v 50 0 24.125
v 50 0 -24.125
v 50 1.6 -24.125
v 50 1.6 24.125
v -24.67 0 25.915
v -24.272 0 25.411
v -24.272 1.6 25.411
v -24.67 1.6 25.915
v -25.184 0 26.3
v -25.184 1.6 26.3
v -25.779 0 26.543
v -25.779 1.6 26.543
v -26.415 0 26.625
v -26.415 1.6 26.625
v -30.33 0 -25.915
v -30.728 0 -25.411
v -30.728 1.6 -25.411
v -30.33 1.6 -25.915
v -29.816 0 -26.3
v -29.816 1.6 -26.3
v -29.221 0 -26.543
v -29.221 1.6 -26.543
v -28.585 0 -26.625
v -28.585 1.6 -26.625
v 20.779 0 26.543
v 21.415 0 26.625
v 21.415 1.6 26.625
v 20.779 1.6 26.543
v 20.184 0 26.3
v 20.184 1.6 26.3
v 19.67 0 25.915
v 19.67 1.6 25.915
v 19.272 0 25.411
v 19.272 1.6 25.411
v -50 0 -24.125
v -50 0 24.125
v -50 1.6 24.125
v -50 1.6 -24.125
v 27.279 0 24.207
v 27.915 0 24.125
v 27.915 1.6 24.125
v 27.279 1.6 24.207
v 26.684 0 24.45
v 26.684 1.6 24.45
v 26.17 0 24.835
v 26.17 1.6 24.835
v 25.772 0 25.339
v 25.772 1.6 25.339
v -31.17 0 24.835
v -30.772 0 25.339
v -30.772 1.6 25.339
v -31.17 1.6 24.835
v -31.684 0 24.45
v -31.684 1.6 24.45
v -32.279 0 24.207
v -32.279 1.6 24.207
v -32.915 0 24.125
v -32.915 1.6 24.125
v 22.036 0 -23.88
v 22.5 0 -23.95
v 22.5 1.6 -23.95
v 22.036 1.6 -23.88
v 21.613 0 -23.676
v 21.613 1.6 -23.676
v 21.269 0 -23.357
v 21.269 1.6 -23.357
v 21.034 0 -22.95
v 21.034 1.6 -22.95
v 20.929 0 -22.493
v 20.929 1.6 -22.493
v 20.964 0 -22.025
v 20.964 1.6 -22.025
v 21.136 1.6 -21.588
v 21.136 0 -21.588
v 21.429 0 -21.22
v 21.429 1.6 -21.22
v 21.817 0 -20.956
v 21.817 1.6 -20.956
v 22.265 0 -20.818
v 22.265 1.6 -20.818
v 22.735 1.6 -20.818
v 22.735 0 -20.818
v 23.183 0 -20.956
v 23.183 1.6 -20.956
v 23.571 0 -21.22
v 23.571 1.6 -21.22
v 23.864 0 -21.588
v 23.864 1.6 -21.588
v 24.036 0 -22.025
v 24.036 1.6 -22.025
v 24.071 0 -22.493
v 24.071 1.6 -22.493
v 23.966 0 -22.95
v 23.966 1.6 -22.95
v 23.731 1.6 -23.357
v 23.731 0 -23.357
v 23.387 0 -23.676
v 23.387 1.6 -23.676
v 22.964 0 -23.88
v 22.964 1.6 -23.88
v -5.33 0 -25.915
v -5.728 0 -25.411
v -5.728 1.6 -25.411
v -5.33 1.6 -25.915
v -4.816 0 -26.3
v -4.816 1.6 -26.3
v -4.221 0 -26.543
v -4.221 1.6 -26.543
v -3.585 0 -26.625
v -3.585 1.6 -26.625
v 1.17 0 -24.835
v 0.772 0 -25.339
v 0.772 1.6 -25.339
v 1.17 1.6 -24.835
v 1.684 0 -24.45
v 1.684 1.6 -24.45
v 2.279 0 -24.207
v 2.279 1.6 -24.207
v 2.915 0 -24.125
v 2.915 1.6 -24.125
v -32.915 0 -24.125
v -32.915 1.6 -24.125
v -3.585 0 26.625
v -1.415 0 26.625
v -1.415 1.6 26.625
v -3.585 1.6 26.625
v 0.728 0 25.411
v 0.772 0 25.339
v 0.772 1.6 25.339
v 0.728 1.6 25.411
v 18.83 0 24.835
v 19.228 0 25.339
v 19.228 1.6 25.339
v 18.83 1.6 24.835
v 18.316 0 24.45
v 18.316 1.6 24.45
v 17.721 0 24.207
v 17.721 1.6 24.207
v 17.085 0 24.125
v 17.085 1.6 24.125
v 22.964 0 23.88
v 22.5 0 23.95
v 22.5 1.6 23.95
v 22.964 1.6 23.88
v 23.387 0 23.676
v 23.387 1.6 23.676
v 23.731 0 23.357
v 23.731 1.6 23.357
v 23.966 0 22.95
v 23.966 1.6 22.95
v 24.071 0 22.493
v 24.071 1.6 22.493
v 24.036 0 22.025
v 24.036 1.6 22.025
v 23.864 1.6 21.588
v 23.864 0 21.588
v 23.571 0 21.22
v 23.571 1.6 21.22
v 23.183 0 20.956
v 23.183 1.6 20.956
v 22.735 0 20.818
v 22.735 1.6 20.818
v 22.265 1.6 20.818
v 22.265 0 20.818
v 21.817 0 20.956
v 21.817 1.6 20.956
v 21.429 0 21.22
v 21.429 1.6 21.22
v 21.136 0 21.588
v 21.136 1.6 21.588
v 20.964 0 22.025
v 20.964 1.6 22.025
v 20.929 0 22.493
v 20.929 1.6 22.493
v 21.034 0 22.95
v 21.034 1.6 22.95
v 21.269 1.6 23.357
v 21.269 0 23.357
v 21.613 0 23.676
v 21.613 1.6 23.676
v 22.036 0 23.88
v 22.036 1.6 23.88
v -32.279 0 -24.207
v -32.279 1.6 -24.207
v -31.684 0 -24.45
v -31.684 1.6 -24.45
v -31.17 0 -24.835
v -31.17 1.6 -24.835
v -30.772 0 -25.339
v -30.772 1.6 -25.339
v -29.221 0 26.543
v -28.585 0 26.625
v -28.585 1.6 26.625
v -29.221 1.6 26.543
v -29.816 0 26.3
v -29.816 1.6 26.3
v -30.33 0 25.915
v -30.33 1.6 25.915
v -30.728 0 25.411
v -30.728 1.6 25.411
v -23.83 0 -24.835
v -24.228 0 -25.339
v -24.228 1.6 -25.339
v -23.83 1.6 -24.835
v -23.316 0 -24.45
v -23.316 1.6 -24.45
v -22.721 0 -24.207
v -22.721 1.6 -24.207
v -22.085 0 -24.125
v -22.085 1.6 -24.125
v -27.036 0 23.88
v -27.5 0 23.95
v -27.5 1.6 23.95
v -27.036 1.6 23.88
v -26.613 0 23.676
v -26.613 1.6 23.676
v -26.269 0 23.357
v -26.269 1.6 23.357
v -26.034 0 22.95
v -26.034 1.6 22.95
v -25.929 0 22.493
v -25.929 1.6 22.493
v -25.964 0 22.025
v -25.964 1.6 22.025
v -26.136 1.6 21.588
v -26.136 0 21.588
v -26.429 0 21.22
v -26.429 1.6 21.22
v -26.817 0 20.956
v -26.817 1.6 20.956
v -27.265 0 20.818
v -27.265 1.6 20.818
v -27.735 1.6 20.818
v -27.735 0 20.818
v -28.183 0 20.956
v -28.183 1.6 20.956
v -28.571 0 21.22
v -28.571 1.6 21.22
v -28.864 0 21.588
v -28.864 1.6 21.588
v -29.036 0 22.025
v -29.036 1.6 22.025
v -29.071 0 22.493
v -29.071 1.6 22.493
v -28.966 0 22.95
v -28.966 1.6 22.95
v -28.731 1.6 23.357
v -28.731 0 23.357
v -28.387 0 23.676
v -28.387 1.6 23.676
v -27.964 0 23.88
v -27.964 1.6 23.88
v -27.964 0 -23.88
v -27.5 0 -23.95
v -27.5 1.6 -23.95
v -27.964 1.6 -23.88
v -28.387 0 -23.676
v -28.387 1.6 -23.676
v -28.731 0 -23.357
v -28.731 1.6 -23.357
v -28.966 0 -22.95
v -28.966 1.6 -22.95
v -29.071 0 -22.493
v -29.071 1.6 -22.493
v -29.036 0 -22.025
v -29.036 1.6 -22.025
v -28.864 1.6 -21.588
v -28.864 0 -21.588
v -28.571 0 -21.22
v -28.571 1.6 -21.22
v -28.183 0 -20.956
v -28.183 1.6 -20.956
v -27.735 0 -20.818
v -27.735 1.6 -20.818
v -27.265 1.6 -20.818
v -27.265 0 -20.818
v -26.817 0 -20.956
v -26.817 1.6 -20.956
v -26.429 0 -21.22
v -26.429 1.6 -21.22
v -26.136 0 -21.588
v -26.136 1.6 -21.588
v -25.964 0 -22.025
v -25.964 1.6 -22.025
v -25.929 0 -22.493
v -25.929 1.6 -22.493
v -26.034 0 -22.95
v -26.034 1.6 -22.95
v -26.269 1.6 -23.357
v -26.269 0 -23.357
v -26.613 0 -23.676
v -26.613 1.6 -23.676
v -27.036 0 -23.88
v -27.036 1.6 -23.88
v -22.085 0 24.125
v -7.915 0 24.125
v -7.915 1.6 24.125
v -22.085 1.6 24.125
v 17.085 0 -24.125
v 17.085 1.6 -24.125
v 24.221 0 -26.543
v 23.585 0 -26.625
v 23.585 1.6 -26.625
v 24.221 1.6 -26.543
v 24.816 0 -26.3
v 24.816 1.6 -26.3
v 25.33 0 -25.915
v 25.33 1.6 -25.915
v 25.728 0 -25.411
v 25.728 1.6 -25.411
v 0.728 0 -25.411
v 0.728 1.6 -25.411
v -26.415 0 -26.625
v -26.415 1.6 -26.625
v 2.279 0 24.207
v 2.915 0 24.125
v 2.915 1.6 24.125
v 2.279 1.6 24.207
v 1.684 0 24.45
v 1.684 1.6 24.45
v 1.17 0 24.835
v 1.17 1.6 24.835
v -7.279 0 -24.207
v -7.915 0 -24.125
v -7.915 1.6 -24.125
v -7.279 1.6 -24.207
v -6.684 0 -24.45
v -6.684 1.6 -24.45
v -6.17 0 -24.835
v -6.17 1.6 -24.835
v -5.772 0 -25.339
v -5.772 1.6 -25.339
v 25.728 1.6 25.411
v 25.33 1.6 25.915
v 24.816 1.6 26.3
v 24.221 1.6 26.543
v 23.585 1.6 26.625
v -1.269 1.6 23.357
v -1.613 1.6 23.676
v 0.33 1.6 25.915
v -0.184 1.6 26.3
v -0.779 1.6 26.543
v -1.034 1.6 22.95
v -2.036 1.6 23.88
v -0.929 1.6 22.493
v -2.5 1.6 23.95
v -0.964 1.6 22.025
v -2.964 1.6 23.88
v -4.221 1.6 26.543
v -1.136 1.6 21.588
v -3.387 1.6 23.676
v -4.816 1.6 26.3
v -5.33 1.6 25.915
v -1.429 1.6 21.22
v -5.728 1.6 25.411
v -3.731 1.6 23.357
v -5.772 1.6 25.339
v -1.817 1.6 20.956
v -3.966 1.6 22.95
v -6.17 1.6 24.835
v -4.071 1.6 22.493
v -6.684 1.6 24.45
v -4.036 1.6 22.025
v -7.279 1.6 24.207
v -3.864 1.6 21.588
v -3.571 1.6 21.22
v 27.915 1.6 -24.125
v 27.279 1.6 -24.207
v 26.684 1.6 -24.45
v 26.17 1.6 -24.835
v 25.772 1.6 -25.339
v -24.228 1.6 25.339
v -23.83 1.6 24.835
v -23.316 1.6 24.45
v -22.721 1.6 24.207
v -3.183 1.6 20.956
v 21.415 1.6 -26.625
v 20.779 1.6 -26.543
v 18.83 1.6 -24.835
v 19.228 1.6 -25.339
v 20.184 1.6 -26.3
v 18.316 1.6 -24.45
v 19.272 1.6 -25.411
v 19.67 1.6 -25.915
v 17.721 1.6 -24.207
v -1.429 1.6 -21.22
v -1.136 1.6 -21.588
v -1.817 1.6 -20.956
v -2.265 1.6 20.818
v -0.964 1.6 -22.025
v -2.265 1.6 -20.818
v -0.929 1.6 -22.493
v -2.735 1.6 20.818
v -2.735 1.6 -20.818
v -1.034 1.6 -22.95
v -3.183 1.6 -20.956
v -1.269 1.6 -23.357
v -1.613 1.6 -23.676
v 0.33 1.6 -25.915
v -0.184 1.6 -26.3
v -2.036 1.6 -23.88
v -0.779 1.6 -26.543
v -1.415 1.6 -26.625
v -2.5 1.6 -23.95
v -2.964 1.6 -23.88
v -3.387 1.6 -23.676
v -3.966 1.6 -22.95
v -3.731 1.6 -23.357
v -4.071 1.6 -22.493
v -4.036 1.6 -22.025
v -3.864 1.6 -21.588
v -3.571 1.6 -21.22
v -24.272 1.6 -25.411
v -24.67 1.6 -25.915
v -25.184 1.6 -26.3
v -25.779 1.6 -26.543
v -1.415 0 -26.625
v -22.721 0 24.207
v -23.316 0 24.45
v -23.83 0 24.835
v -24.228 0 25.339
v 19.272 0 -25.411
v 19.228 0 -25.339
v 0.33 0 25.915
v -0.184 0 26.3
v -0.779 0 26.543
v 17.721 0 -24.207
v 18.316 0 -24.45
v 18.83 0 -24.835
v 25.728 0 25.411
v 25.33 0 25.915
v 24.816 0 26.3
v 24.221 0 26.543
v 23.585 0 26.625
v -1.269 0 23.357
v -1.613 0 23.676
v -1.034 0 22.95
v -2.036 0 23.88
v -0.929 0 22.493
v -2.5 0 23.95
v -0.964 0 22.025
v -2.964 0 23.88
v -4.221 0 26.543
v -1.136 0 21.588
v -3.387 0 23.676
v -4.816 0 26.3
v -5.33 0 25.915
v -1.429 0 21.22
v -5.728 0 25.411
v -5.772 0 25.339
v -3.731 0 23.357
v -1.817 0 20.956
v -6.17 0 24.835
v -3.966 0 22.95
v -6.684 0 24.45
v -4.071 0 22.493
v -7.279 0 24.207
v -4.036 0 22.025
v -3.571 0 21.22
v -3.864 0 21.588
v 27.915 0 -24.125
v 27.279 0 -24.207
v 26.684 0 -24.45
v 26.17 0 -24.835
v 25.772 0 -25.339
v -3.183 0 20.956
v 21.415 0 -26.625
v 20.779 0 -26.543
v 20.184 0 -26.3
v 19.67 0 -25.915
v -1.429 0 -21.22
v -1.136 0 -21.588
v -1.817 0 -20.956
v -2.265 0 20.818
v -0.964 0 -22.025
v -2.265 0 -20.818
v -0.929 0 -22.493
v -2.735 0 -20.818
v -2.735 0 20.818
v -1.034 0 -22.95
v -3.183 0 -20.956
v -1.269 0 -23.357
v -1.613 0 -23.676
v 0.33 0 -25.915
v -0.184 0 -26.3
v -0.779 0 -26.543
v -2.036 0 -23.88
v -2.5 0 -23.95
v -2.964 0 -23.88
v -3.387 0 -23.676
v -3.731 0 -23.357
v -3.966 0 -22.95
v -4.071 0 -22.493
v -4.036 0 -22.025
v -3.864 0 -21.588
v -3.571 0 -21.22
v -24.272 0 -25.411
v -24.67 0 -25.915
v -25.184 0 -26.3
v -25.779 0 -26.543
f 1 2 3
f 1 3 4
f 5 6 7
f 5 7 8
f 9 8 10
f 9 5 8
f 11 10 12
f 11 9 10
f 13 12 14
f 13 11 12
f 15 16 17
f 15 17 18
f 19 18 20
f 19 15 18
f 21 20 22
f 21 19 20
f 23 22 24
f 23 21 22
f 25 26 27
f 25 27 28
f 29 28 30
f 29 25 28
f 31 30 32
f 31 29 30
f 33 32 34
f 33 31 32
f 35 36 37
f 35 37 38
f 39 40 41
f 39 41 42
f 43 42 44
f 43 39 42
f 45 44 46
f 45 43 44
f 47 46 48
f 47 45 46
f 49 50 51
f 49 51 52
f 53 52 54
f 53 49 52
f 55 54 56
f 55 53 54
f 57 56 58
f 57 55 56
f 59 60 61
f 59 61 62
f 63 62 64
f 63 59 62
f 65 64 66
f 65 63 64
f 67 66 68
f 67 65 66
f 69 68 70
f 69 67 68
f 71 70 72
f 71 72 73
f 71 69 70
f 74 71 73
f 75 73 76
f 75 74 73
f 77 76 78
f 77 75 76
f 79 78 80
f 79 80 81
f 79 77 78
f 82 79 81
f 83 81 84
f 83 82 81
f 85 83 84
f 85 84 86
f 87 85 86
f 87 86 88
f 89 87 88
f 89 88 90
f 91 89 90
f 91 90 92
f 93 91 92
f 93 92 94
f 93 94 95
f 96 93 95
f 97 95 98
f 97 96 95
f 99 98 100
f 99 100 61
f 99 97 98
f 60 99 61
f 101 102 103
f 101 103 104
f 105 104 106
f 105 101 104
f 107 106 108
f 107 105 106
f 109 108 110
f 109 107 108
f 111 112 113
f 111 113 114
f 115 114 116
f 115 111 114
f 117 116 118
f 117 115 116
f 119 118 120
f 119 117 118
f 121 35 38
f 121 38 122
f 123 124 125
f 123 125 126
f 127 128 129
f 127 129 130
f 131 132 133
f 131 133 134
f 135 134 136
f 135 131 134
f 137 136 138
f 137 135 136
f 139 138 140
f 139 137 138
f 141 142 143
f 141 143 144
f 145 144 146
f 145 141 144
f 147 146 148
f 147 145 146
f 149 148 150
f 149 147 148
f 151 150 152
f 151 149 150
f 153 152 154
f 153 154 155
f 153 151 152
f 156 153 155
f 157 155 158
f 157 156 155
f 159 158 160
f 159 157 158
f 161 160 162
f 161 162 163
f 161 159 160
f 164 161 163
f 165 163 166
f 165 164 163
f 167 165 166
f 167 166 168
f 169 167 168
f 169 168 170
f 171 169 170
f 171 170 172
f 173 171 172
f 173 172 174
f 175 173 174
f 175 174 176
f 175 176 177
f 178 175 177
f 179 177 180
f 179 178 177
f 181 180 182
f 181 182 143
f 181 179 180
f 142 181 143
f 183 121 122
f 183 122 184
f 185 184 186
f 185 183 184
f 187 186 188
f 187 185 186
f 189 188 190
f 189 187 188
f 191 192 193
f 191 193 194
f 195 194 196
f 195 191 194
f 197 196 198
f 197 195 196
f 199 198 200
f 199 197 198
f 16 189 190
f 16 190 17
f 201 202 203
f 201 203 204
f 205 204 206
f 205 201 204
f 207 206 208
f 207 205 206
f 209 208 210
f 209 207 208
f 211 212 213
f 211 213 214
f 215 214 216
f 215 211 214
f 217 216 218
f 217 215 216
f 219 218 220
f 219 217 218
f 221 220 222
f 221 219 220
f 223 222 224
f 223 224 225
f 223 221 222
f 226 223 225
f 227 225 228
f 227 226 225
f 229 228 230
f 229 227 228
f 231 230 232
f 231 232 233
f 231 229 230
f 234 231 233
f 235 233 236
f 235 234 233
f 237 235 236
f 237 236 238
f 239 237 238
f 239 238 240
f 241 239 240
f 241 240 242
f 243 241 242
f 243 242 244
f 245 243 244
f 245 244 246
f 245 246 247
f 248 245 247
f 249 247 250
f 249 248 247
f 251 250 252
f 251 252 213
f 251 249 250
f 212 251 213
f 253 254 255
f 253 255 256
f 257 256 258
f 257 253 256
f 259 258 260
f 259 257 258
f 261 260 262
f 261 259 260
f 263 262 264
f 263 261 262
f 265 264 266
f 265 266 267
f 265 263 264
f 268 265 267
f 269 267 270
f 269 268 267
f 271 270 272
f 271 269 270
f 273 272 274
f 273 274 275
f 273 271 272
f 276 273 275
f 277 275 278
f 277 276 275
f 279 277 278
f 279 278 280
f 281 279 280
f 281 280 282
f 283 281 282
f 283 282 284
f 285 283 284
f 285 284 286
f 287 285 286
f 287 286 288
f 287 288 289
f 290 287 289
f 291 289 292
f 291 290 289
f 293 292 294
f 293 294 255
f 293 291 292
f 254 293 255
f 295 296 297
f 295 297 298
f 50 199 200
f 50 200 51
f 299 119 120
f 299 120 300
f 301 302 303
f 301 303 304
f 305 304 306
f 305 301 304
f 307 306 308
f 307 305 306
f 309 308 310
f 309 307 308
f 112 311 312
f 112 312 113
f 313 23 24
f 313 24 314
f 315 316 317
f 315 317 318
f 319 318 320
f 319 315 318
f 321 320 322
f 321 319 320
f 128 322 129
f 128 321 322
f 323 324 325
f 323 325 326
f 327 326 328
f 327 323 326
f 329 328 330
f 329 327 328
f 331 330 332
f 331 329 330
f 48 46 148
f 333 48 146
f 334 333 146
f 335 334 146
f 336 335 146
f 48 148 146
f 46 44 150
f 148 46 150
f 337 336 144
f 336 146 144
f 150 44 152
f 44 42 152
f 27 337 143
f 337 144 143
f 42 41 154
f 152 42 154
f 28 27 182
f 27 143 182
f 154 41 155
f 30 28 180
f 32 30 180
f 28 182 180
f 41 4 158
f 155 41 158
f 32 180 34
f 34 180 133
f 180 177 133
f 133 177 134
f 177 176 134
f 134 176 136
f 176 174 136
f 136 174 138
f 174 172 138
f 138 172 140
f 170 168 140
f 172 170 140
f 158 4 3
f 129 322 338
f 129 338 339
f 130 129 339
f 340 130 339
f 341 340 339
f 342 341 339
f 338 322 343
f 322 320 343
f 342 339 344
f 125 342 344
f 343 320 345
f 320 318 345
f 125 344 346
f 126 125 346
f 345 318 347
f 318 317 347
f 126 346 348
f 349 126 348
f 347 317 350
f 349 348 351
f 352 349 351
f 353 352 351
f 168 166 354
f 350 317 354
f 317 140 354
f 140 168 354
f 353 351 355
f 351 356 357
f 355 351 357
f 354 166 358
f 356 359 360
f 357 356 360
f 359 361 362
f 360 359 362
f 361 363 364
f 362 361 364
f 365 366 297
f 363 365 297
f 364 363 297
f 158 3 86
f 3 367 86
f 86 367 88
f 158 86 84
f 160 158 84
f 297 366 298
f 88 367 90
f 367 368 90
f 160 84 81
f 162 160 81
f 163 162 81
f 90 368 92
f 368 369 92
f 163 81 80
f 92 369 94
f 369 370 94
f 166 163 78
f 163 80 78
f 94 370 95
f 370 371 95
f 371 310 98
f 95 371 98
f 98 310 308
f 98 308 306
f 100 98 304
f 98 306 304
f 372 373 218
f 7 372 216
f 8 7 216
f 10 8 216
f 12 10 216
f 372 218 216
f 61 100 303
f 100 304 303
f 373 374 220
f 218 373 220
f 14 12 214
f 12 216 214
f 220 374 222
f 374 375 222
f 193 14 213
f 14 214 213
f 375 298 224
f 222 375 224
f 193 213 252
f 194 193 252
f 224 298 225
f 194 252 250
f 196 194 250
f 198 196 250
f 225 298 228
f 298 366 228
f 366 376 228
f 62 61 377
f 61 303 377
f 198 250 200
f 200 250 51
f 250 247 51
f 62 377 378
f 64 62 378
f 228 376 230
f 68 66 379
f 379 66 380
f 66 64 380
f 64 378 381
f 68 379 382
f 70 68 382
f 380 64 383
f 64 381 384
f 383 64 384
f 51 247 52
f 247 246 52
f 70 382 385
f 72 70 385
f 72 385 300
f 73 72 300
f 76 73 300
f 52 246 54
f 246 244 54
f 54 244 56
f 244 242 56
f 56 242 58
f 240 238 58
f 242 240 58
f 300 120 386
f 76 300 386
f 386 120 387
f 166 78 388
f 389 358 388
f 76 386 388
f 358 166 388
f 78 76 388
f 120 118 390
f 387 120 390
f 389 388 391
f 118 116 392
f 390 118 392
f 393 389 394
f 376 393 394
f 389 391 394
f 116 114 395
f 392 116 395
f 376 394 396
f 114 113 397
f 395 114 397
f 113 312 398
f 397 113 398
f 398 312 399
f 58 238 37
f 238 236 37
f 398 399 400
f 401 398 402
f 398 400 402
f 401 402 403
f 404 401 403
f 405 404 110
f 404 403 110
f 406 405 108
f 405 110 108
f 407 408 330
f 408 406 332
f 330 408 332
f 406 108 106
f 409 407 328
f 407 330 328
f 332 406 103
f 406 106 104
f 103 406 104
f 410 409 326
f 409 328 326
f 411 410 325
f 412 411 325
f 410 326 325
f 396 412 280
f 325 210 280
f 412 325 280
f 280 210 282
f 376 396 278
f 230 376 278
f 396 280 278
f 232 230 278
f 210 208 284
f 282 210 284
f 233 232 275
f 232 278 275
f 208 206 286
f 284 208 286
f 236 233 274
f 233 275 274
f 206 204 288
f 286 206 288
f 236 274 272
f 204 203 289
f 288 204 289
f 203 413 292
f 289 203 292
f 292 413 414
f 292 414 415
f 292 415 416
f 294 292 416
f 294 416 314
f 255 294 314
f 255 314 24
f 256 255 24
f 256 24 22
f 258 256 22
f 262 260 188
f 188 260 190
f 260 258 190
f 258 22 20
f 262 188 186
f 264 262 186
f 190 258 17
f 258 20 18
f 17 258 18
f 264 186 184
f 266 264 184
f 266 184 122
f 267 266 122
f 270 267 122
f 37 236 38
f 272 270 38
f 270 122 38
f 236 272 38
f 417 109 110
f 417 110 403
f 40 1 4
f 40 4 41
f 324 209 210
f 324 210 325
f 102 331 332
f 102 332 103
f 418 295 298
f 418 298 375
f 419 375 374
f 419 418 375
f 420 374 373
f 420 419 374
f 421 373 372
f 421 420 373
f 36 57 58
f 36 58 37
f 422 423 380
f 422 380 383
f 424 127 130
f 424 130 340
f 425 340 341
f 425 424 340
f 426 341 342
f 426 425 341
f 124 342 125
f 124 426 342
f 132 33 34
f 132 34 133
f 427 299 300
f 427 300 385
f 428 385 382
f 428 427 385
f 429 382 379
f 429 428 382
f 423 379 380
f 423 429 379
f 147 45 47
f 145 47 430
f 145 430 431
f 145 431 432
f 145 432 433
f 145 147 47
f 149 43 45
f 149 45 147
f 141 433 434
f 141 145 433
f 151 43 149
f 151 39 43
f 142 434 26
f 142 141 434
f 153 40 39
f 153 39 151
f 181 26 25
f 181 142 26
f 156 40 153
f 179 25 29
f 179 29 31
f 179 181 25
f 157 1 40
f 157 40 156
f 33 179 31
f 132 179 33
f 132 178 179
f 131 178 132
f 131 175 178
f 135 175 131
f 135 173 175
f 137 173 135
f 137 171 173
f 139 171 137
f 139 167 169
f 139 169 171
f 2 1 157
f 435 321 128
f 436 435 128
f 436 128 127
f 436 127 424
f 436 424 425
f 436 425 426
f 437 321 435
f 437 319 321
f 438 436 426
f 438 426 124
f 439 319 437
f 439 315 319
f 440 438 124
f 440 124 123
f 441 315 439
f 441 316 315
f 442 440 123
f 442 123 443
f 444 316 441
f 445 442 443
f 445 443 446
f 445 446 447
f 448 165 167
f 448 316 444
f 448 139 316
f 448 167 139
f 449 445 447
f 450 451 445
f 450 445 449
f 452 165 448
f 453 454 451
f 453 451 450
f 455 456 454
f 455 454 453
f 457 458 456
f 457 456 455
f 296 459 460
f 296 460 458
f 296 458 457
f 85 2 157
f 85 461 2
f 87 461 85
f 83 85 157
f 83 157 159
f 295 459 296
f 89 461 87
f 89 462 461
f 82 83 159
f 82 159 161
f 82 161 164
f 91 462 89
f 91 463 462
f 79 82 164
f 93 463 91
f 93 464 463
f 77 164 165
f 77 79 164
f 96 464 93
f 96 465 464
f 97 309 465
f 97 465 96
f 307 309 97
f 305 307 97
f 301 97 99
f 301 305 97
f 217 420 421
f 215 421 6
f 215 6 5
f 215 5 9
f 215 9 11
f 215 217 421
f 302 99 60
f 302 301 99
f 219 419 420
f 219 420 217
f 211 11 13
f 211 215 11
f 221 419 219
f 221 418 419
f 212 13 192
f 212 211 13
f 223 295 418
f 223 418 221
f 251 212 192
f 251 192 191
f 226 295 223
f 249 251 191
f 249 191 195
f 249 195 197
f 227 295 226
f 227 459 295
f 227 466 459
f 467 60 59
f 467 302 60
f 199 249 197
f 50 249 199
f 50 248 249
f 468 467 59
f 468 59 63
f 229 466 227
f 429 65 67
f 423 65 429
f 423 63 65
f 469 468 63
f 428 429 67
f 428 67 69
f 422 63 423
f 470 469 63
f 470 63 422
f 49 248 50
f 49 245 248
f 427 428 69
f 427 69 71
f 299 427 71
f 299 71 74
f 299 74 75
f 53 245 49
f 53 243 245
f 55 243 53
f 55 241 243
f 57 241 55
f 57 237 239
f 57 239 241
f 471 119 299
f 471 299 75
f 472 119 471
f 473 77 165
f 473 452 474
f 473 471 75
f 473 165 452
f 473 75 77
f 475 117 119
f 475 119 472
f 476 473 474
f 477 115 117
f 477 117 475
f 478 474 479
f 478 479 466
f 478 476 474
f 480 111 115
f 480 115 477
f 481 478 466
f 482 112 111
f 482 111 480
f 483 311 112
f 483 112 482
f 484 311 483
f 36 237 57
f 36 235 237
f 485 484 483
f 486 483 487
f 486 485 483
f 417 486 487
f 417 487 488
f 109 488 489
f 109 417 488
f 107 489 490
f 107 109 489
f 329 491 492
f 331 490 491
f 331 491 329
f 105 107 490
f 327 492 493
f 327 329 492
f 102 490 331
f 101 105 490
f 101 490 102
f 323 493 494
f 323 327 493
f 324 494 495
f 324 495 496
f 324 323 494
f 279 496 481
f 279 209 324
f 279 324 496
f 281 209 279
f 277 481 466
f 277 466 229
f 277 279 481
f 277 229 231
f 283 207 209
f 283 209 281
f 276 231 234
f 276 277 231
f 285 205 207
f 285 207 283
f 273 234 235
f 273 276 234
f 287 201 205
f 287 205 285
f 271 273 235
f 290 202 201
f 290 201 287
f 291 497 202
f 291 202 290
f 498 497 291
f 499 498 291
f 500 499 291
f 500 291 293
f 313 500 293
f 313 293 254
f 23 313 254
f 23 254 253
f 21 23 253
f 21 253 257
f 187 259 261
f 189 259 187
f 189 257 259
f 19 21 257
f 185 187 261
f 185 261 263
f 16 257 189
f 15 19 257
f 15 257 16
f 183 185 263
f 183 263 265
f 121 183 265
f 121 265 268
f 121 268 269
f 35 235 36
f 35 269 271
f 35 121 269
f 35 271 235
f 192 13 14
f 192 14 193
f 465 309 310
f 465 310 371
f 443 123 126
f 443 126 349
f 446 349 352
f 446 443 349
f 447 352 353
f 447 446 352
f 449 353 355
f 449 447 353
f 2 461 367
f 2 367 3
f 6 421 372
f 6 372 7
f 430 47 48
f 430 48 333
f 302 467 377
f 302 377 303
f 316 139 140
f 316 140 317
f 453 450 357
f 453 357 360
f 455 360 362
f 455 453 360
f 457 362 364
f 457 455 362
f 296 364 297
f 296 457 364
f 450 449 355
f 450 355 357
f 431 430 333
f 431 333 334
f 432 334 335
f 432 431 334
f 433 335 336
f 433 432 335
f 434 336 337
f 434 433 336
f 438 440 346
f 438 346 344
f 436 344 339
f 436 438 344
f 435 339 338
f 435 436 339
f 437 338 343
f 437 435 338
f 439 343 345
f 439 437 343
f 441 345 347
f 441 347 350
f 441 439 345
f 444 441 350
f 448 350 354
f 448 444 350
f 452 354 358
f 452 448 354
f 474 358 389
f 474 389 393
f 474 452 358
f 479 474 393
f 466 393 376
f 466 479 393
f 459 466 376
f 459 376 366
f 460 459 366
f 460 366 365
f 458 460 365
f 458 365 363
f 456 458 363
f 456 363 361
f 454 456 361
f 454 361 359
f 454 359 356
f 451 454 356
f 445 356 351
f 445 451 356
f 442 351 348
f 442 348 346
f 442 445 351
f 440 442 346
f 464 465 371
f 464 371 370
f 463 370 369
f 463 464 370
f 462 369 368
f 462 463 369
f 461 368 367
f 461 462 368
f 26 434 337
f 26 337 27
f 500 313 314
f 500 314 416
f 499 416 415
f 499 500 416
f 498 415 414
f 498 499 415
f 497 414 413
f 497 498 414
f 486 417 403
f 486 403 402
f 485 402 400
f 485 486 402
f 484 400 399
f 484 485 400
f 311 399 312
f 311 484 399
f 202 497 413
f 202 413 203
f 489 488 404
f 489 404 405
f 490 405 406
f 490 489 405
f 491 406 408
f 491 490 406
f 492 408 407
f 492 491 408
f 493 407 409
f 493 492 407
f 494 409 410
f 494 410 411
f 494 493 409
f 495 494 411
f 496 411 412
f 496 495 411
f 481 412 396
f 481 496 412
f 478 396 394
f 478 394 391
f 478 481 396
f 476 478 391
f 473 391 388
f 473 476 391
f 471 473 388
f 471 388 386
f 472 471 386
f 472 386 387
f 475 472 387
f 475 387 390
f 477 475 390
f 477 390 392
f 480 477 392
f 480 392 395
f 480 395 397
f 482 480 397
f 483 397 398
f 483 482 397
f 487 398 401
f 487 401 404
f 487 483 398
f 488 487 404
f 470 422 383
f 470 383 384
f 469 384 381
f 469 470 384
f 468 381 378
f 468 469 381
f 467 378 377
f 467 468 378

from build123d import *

# Parameters (mm, degrees)
SKETCH1_R           = 1.575
BOSS_EXTRUDE1_DEPTH = 1.6


with BuildPart() as part:
    # Sketch1 → Boss-Extrude1 (new body)
    with BuildSketch(Plane(origin=(0, 0, 0), x_dir=(1, 0, 0), z_dir=(0, 1, 0))):
        with BuildLine():
            Line((-50, 24.125), (-32.915475947, 24.125))
            ThreePointArc((-32.915475947, 24.125), (-31.68372891, 24.449500233), (-30.771743633, 25.338760611))
            Line((-30.771743633, 25.338760611), (-30.728256367, 25.411239389))
            ThreePointArc((-30.728256367, 25.411239389), (-29.81627109, 26.300499767), (-28.584524053, 26.625))
            Line((-28.584524053, 26.625), (-26.415475947, 26.625))
            ThreePointArc((-26.415475947, 26.625), (-25.18372891, 26.300499767), (-24.271743633, 25.411239389))
            Line((-24.271743633, 25.411239389), (-24.228256367, 25.338760611))
            ThreePointArc((-24.228256367, 25.338760611), (-23.31627109, 24.449500233), (-22.084524053, 24.125))
            Line((-22.084524053, 24.125), (-7.915475947, 24.125))
            ThreePointArc((-7.915475947, 24.125), (-6.68372891, 24.449500233), (-5.771743633, 25.338760611))
            Line((-5.771743633, 25.338760611), (-5.728256367, 25.411239389))
            ThreePointArc((-5.728256367, 25.411239389), (-4.81627109, 26.300499767), (-3.584524053, 26.625))
            Line((-3.584524053, 26.625), (-1.415475947, 26.625))
            ThreePointArc((-1.415475947, 26.625), (-0.18372891, 26.300499767), (0.728256367, 25.411239389))
            Line((0.728256367, 25.411239389), (0.771743633, 25.338760611))
            ThreePointArc((0.771743633, 25.338760611), (1.68372891, 24.449500233), (2.915475947, 24.125))
            Line((2.915475947, 24.125), (17.084524053, 24.125))
            ThreePointArc((17.084524053, 24.125), (18.31627109, 24.449500233), (19.228256367, 25.338760611))
            Line((19.228256367, 25.338760611), (19.271743633, 25.411239389))
            ThreePointArc((19.271743633, 25.411239389), (20.18372891, 26.300499767), (21.415475947, 26.625))
            Line((21.415475947, 26.625), (23.584524053, 26.625))
            ThreePointArc((23.584524053, 26.625), (24.81627109, 26.300499767), (25.728256367, 25.411239389))
            Line((25.728256367, 25.411239389), (25.771743633, 25.338760611))
            ThreePointArc((25.771743633, 25.338760611), (26.68372891, 24.449500233), (27.915475947, 24.125))
            Line((27.915475947, 24.125), (50, 24.125))
            Line((50, 24.125), (50, -24.125))
            Line((50, -24.125), (27.915475947, -24.125))
            ThreePointArc((27.915475947, -24.125), (26.68372891, -24.449500233), (25.771743633, -25.338760611))
            Line((25.771743633, -25.338760611), (25.728256367, -25.411239389))
            ThreePointArc((25.728256367, -25.411239389), (24.81627109, -26.300499767), (23.584524053, -26.625))
            Line((23.584524053, -26.625), (21.415475947, -26.625))
            ThreePointArc((21.415475947, -26.625), (20.18372891, -26.300499767), (19.271743633, -25.411239389))
            Line((19.271743633, -25.411239389), (19.228256367, -25.338760611))
            ThreePointArc((19.228256367, -25.338760611), (18.31627109, -24.449500233), (17.084524053, -24.125))
            Line((17.084524053, -24.125), (2.915475947, -24.125))
            ThreePointArc((2.915475947, -24.125), (1.68372891, -24.449500233), (0.771743633, -25.338760611))
            Line((0.771743633, -25.338760611), (0.728256367, -25.411239389))
            ThreePointArc((0.728256367, -25.411239389), (-0.18372891, -26.300499767), (-1.415475947, -26.625))
            Line((-1.415475947, -26.625), (-3.584524053, -26.625))
            ThreePointArc((-3.584524053, -26.625), (-4.81627109, -26.300499767), (-5.728256367, -25.411239389))
            Line((-5.728256367, -25.411239389), (-5.771743633, -25.338760611))
            ThreePointArc((-5.771743633, -25.338760611), (-6.68372891, -24.449500233), (-7.915475947, -24.125))
            Line((-7.915475947, -24.125), (-22.084524053, -24.125))
            ThreePointArc((-22.084524053, -24.125), (-23.31627109, -24.449500233), (-24.228256367, -25.338760611))
            Line((-24.228256367, -25.338760611), (-24.271743633, -25.411239389))
            ThreePointArc((-24.271743633, -25.411239389), (-25.18372891, -26.300499767), (-26.415475947, -26.625))
            Line((-26.415475947, -26.625), (-28.584524053, -26.625))
            ThreePointArc((-28.584524053, -26.625), (-29.81627109, -26.300499767), (-30.728256367, -25.411239389))
            Line((-30.728256367, -25.411239389), (-30.771743633, -25.338760611))
            ThreePointArc((-30.771743633, -25.338760611), (-31.68372891, -24.449500233), (-32.915475947, -24.125))
            Line((-32.915475947, -24.125), (-50, -24.125))
            Line((-50, -24.125), (-50, 24.125))
        make_face()
        with Locations(Location((-27.5, -22.375, 0), (0, 0, 270))):
            Circle(SKETCH1_R, mode=Mode.SUBTRACT)
        with Locations(Location((-27.5, 22.375, 0), (0, 0, 90))):
            Circle(SKETCH1_R, mode=Mode.SUBTRACT)
        with Locations(Location((-2.5, 22.375, 0), (0, 0, 90))):
            Circle(SKETCH1_R, mode=Mode.SUBTRACT)
        with Locations(Location((-2.5, -22.375, 0), (0, 0, 270))):
            Circle(SKETCH1_R, mode=Mode.SUBTRACT)
        with Locations(Location((22.5, 22.375, 0), (0, 0, 90))):
            Circle(SKETCH1_R, mode=Mode.SUBTRACT)
        with Locations(Location((22.5, -22.375, 0), (0, 0, 270))):
            Circle(SKETCH1_R, mode=Mode.SUBTRACT)
    extrude(amount=BOSS_EXTRUDE1_DEPTH)


solid = part.part
